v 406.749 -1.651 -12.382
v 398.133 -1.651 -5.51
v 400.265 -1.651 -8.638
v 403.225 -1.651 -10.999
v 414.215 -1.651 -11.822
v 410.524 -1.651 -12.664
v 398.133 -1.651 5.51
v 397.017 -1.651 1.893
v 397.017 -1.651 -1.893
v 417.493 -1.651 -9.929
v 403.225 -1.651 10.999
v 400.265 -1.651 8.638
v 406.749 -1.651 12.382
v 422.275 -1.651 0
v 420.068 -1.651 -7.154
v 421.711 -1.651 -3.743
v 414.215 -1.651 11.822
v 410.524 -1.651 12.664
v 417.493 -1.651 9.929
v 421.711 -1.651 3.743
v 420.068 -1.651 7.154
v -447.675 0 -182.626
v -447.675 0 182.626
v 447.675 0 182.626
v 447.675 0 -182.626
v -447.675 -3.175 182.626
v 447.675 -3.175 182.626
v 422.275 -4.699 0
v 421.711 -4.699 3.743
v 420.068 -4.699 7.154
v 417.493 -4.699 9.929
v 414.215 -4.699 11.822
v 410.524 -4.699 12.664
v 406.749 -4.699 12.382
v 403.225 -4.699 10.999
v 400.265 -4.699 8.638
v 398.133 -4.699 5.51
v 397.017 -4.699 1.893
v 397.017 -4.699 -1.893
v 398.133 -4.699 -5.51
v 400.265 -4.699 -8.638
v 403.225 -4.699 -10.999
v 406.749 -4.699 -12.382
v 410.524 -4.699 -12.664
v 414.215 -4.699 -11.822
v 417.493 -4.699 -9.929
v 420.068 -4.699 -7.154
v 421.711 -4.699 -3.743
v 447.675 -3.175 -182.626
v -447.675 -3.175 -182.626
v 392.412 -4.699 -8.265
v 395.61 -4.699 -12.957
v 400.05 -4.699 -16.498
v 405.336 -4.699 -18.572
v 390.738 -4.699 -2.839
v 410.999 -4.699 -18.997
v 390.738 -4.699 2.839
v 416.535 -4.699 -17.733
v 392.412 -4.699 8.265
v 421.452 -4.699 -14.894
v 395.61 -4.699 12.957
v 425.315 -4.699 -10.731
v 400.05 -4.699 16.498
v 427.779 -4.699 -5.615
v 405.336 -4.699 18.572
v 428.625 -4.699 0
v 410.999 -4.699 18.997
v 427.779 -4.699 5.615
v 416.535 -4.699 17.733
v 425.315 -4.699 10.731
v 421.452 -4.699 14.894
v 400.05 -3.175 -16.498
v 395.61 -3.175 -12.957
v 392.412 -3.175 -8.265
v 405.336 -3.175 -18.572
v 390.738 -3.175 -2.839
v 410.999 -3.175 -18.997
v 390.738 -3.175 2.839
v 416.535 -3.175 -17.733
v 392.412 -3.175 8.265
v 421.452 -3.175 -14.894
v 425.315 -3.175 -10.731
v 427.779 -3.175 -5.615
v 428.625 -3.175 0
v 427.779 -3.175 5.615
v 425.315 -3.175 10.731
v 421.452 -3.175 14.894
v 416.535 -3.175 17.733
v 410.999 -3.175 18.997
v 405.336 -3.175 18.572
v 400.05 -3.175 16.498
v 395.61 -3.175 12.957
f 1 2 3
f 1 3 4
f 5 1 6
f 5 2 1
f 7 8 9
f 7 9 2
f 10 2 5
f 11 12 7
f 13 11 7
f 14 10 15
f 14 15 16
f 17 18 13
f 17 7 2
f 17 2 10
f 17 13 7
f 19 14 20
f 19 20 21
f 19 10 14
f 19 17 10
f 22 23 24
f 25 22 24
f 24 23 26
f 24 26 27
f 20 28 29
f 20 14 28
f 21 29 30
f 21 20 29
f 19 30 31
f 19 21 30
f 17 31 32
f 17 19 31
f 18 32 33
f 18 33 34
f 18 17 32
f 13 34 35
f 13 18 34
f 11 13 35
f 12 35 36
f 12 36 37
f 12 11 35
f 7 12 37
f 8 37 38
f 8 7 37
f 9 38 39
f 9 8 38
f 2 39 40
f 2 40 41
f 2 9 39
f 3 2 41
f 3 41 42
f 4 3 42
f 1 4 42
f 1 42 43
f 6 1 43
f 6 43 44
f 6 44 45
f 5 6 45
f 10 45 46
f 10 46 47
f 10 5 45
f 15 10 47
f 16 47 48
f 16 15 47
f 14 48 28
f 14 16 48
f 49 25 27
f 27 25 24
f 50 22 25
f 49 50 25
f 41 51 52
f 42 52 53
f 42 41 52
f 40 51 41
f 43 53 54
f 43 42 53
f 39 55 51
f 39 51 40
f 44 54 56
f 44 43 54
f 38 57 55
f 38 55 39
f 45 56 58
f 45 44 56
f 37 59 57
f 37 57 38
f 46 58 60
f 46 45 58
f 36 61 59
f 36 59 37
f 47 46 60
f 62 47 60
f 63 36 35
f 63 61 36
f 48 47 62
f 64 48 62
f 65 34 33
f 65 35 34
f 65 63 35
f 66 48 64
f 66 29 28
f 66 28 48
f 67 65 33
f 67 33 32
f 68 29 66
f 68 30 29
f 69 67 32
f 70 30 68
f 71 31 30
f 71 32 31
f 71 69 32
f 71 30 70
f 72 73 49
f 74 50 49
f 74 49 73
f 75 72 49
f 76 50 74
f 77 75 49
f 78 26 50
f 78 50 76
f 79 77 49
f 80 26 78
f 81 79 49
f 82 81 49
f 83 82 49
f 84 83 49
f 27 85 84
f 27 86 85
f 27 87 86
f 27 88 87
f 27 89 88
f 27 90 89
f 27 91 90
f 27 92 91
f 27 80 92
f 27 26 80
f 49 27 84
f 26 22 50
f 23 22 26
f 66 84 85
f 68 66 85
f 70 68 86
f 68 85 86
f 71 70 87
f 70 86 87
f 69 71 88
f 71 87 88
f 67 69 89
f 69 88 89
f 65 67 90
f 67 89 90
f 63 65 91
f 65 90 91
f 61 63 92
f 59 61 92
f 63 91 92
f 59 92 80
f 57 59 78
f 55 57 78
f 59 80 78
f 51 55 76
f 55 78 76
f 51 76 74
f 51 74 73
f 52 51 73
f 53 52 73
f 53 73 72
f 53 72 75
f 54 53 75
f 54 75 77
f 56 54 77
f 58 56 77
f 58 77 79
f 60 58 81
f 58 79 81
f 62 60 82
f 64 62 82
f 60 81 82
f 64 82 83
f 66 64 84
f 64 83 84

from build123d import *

# Parameters (mm, degrees)
F0_W     = 895.35
F0_H     = 365.252
F1_DEPTH = 3.175
F2_R     = 19.05
F2_R_2   = 12.7
F3_DEPTH = 1.524
F4_DEPTH = 1.524


with BuildPart() as f1:
    # F0 (on Front) → F1 (new body)
    with BuildSketch(Plane.XZ):
        Rectangle(F0_W, F0_H)
    extrude(amount=F1_DEPTH)

    # F2 (on face) → F3 (join)
    with BuildSketch(Plane.XZ.offset(3.175)):
        with Locations((409.575, 0)):
            Circle(F2_R)
        with Locations((409.575, 0)):
            Circle(F2_R_2, mode=Mode.SUBTRACT)
    extrude(amount=F3_DEPTH)

    # F4 (cut): a face of the model
    f4_faces = [f1.faces().sort_by_distance(p)[0] for p in [
        (409.575, -3.175, 0),
    ]]
    extrude(f4_faces, amount=-F4_DEPTH, mode=Mode.SUBTRACT)


solid = f1.part
